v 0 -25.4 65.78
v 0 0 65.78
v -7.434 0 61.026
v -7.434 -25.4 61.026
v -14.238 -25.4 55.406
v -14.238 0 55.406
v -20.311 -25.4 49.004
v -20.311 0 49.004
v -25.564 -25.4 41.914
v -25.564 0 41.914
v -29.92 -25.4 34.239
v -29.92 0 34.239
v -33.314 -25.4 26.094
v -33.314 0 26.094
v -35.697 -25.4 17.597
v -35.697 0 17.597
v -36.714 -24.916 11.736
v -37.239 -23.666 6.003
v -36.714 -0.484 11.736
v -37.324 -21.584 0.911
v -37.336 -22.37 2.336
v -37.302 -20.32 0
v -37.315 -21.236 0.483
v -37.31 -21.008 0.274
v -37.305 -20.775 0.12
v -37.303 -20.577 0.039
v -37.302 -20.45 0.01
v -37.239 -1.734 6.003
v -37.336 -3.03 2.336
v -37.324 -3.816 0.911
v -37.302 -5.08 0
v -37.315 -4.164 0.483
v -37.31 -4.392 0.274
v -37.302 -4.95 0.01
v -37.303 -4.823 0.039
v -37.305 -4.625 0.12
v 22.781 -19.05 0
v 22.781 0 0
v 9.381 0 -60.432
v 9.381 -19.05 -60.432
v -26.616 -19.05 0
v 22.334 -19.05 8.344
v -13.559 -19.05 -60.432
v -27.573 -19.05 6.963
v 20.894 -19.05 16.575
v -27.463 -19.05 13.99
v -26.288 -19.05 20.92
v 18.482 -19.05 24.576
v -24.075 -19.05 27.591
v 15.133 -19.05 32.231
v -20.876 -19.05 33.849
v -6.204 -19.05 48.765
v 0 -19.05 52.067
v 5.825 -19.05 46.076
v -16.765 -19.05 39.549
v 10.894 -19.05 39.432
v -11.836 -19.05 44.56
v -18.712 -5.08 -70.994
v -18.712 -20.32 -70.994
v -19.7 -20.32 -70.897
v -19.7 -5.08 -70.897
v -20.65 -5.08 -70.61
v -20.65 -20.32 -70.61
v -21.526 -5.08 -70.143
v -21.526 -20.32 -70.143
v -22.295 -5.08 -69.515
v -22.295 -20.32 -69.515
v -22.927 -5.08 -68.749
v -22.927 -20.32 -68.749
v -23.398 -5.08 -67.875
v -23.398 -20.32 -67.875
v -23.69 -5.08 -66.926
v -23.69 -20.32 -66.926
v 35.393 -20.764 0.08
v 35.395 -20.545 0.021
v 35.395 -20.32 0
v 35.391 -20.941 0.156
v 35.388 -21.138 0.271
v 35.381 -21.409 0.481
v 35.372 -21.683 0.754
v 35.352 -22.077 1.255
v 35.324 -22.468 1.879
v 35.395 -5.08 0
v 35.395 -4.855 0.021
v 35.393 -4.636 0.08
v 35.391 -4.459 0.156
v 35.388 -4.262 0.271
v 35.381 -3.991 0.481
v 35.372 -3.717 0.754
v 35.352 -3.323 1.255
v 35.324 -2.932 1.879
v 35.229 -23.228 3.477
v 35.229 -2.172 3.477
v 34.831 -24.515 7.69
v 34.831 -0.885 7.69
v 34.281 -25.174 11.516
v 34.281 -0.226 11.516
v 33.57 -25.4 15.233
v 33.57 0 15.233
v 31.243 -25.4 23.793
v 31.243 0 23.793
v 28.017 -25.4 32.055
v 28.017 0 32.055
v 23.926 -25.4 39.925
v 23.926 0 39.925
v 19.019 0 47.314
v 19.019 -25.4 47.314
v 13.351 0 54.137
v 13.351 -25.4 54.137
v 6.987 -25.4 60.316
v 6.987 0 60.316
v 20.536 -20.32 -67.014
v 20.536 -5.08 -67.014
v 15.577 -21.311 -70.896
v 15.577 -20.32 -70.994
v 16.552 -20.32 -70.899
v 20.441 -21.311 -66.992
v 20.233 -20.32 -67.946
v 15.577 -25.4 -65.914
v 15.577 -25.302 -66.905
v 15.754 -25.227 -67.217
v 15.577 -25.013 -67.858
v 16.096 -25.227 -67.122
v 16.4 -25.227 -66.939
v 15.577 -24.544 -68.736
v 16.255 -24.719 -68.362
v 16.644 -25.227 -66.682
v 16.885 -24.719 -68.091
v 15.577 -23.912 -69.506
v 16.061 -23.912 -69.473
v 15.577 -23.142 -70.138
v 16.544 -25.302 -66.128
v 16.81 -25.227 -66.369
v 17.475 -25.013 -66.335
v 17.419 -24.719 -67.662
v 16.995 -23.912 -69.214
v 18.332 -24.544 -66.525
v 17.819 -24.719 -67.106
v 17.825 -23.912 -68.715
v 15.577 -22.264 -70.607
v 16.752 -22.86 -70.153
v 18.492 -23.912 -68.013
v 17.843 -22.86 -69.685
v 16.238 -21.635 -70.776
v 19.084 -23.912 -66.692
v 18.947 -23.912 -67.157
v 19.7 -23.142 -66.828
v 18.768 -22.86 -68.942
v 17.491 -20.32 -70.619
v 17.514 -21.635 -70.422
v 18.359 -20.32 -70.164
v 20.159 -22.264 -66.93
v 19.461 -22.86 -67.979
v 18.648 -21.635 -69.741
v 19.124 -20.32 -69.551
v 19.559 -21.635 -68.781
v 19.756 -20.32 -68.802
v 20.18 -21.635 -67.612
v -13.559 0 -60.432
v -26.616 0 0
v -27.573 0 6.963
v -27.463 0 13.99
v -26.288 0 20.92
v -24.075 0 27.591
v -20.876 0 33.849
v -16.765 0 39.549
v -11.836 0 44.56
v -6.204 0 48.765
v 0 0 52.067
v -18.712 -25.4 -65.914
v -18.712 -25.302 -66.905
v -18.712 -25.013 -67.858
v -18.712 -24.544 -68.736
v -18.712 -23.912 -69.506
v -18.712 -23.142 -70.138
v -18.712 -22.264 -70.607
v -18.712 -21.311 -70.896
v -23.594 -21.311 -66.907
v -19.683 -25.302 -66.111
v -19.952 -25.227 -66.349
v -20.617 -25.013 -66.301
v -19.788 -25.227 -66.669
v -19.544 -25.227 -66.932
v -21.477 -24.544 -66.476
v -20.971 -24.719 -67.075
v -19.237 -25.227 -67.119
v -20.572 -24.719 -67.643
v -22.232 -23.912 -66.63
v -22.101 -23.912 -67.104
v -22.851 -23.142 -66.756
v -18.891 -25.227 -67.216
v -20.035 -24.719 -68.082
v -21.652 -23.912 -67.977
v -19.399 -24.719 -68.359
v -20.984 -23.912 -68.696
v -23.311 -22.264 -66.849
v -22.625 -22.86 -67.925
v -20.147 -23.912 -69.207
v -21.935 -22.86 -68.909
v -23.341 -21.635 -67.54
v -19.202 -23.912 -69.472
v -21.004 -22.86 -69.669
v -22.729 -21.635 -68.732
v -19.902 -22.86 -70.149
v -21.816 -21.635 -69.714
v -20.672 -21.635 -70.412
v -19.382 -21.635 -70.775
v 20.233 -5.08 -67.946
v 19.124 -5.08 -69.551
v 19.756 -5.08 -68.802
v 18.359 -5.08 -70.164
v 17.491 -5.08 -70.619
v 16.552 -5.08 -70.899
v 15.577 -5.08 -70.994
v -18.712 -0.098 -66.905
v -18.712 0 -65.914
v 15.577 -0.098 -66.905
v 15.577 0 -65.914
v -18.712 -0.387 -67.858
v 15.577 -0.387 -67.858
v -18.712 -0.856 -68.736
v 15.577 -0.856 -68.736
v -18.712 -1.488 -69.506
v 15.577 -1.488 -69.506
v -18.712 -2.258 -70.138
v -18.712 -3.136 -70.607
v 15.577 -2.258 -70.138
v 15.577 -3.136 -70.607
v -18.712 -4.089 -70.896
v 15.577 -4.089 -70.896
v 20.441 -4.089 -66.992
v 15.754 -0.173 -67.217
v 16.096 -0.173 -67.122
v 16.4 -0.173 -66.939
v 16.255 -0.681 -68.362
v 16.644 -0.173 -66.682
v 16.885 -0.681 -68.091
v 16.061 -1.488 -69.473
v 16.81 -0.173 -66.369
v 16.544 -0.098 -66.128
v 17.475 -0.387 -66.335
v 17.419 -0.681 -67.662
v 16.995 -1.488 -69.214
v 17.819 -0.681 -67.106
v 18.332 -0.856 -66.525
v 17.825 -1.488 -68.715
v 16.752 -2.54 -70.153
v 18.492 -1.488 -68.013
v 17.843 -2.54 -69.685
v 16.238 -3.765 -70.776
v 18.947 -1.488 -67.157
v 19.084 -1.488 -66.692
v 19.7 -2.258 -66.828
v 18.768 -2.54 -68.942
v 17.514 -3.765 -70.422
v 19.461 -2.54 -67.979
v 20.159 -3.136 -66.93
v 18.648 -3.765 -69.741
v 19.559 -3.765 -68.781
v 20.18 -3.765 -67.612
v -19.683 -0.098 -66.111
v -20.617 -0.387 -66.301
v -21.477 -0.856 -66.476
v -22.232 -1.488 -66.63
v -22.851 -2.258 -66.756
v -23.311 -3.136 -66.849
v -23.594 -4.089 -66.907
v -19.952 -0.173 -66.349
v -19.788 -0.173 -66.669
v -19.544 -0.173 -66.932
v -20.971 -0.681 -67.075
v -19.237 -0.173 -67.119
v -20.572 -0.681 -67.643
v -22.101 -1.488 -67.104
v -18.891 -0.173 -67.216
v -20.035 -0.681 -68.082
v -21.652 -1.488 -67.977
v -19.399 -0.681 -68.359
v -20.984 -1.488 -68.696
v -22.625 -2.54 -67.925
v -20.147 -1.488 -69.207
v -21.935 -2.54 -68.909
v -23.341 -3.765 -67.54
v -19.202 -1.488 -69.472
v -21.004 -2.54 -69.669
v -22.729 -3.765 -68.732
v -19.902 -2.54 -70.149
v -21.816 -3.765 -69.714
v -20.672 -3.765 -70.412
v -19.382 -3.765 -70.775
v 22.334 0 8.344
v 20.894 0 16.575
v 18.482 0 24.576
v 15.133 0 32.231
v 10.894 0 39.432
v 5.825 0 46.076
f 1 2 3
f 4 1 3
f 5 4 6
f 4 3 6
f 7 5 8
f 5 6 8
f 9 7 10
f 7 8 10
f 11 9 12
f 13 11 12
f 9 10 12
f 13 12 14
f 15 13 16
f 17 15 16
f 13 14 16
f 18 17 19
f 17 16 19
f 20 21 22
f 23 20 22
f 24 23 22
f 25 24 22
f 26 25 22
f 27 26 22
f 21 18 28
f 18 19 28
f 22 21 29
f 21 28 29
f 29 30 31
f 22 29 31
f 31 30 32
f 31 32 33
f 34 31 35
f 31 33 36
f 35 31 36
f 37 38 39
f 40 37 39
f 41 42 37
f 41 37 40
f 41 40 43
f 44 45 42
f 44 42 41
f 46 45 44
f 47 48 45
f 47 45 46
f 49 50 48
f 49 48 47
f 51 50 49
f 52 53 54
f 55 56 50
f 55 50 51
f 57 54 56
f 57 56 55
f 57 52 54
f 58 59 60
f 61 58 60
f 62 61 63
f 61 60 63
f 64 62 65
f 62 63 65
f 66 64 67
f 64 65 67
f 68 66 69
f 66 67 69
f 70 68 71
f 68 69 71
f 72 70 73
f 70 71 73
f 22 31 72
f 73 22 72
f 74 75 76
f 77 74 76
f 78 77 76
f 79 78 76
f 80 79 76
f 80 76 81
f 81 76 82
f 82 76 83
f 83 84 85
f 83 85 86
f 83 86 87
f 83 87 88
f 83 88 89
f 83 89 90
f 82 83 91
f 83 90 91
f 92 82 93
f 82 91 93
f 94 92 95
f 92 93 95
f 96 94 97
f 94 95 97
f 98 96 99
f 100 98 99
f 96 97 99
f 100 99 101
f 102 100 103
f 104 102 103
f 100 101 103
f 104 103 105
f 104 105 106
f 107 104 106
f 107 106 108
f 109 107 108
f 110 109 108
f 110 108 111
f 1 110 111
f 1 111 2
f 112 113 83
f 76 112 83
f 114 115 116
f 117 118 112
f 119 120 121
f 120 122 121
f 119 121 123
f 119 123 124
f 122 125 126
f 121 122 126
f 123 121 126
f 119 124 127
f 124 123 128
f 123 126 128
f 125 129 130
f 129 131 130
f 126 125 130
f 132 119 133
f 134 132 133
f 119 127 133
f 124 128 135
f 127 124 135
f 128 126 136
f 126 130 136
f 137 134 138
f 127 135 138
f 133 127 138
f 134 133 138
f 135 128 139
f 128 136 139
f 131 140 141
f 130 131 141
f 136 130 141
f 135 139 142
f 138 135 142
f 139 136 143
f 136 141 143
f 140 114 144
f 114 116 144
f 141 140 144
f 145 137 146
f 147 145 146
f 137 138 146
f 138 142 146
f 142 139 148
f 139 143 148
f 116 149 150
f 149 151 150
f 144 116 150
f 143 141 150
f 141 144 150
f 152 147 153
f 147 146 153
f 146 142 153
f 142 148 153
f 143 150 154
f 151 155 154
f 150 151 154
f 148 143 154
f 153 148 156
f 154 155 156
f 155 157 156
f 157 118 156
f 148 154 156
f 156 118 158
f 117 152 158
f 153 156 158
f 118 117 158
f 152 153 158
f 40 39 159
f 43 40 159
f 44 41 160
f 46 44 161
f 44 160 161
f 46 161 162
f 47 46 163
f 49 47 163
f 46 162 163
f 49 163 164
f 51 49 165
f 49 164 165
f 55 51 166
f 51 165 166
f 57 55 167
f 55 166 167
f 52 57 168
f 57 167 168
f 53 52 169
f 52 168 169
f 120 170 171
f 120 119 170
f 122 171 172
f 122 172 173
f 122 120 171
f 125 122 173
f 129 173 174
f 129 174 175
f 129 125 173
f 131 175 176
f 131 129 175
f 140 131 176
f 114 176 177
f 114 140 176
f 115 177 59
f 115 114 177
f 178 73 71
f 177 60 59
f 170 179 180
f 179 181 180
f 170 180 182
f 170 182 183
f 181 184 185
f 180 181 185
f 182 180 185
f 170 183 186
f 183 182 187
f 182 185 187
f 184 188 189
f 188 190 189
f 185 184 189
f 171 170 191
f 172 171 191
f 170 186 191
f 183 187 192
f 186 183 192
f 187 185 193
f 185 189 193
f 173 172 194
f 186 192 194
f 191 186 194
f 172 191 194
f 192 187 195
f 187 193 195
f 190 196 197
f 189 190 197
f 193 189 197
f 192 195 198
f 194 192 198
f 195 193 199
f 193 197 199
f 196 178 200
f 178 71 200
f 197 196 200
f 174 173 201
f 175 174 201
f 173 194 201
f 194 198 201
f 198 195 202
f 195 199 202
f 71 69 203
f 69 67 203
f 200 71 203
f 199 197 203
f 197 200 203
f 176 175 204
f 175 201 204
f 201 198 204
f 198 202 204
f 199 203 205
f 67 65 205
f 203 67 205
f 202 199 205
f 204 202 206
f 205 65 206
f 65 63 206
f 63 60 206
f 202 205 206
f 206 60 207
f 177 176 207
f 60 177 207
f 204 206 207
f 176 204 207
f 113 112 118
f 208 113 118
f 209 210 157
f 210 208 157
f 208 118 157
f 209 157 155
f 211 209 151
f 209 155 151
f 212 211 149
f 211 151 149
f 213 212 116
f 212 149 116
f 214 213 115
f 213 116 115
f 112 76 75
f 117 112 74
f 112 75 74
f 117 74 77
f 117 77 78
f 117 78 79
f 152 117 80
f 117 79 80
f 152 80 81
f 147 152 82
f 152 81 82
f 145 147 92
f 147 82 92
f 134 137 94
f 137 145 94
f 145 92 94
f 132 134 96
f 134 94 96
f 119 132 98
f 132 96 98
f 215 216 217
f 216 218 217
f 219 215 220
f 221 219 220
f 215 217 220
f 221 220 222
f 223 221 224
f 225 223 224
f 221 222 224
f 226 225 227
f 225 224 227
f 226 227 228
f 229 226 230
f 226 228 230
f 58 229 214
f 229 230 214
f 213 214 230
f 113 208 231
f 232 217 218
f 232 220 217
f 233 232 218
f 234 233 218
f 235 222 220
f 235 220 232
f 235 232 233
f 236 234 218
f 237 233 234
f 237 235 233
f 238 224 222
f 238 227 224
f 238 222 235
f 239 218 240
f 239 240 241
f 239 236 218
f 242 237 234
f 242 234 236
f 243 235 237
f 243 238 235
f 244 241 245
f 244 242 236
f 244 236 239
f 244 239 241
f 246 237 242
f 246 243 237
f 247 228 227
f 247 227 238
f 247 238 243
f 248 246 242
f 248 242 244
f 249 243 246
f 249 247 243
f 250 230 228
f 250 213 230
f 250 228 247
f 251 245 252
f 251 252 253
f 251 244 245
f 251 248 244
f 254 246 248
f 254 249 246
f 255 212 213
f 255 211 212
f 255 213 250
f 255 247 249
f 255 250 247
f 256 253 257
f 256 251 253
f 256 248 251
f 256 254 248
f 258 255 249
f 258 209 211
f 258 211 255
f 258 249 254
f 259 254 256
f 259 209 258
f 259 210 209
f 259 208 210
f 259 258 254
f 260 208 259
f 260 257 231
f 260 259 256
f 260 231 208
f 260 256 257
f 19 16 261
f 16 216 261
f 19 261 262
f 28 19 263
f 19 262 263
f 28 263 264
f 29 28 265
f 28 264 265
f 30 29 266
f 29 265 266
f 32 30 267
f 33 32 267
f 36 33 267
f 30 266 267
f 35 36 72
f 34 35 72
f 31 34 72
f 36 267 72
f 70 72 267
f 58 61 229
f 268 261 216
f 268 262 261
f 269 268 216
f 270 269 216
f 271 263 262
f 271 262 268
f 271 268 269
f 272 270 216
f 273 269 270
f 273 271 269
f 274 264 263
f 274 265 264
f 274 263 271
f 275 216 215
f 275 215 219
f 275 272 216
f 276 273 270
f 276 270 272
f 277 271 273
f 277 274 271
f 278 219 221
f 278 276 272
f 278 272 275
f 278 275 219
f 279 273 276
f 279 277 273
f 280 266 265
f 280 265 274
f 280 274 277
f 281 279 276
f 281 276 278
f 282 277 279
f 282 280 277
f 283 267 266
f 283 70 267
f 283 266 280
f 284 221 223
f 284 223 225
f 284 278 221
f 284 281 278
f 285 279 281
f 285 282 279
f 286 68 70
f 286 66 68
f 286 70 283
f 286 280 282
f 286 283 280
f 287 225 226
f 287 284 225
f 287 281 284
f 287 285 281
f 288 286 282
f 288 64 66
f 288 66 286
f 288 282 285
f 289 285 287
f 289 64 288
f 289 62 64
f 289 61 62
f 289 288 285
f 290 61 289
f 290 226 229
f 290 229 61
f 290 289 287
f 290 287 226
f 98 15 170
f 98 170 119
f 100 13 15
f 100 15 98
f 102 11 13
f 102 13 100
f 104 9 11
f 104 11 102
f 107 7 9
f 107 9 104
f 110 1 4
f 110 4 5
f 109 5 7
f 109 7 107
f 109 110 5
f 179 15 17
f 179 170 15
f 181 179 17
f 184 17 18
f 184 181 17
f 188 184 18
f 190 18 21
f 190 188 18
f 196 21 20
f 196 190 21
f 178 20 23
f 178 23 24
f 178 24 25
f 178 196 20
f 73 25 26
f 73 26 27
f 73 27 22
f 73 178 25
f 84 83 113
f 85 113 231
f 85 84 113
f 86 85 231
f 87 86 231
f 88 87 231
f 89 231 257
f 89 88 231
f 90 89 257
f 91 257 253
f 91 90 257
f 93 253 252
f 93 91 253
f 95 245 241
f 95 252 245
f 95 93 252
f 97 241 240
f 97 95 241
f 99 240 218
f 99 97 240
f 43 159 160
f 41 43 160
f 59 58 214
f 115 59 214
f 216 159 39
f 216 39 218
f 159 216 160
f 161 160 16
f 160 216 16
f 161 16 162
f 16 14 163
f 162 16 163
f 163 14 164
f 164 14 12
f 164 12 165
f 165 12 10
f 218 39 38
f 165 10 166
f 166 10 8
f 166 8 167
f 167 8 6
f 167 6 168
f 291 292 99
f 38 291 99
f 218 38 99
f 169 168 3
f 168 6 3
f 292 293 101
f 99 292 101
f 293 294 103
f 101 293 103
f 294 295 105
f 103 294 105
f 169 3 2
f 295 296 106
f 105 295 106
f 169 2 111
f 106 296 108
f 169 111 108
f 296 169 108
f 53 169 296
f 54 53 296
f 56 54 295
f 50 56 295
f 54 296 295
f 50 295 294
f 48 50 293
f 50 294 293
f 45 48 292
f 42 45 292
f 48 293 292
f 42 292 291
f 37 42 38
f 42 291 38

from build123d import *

# Parameters (mm, degrees)
F1_DEPTH = 25.4
F3_DEPTH = 19.05
F4_DEPTH = 19.05
F5_R     = 5.08


with BuildPart() as f1:
    # F0 (on Front) → F1 (new body)
    with BuildSketch(Plane.XZ):
        with BuildLine():
            ThreePointArc((35.395226, 0), (25.519415, 37.09865), (0, 65.779671))
            ThreePointArc((0, 65.779671), (-27.871905, 38.118795), (-37.301891, 0))
            Line((-37.301891, 0), (-22.862449, -70.993923))
            Line((-22.862449, -70.993923), (19.653682, -70.993923))
            Line((19.653682, -70.993923), (35.395226, 0))
        make_face()
    extrude(amount=F1_DEPTH)

    # F2 (on face) → F3 (cut)
    with BuildSketch(Plane(origin=(0, 0, 0), x_dir=(-1, 0, 0), z_dir=(0, 1, 0))):
        with BuildLine():
            ThreePointArc((26.61556, 0), (22.594878, 30.780864), (0, 52.066986))
            ThreePointArc((0, 52.066986), (-16.922181, 28.453793), (-22.78091, 0))
            Line((-22.78091, 0), (-9.381168, -60.432459))
            Line((-9.381168, -60.432459), (13.559343, -60.432459))
            Line((13.559343, -60.432459), (26.61556, 0))
        make_face()
    extrude(amount=F3_DEPTH, mode=Mode.SUBTRACT)

    # F2 (on face) → F4 (cut)
    with BuildSketch(Plane(origin=(0, 0, 0), x_dir=(-1, 0, 0), z_dir=(0, 1, 0))):
        with BuildLine():
            ThreePointArc((26.61556, 0), (22.594878, 30.780864), (0, 52.066986))
            ThreePointArc((0, 52.066986), (-16.922181, 28.453793), (-22.78091, 0))
            Line((-22.78091, 0), (-9.381168, -60.432459))
            Line((-9.381168, -60.432459), (13.559343, -60.432459))
            Line((13.559343, -60.432459), (26.61556, 0))
        make_face()
    extrude(amount=-F4_DEPTH, mode=Mode.SUBTRACT)

    # F5
    f5_edges = [f1.edges().sort_by_distance(p)[0] for p in [
        (27.524454, 0, -35.496961),
        (27.524454, -25.4, -35.496961),
        (19.653682, -12.7, -70.993923),
        (-1.604384, 0, -70.993923),
        (-1.604384, -25.4, -70.993923),
        (-22.862449, -12.7, -70.993923),
        (-30.08217, 0, -35.496961),
        (-30.08217, -25.4, -35.496961),
    ]]
    fillet(f5_edges, radius=F5_R)


solid = f1.part
